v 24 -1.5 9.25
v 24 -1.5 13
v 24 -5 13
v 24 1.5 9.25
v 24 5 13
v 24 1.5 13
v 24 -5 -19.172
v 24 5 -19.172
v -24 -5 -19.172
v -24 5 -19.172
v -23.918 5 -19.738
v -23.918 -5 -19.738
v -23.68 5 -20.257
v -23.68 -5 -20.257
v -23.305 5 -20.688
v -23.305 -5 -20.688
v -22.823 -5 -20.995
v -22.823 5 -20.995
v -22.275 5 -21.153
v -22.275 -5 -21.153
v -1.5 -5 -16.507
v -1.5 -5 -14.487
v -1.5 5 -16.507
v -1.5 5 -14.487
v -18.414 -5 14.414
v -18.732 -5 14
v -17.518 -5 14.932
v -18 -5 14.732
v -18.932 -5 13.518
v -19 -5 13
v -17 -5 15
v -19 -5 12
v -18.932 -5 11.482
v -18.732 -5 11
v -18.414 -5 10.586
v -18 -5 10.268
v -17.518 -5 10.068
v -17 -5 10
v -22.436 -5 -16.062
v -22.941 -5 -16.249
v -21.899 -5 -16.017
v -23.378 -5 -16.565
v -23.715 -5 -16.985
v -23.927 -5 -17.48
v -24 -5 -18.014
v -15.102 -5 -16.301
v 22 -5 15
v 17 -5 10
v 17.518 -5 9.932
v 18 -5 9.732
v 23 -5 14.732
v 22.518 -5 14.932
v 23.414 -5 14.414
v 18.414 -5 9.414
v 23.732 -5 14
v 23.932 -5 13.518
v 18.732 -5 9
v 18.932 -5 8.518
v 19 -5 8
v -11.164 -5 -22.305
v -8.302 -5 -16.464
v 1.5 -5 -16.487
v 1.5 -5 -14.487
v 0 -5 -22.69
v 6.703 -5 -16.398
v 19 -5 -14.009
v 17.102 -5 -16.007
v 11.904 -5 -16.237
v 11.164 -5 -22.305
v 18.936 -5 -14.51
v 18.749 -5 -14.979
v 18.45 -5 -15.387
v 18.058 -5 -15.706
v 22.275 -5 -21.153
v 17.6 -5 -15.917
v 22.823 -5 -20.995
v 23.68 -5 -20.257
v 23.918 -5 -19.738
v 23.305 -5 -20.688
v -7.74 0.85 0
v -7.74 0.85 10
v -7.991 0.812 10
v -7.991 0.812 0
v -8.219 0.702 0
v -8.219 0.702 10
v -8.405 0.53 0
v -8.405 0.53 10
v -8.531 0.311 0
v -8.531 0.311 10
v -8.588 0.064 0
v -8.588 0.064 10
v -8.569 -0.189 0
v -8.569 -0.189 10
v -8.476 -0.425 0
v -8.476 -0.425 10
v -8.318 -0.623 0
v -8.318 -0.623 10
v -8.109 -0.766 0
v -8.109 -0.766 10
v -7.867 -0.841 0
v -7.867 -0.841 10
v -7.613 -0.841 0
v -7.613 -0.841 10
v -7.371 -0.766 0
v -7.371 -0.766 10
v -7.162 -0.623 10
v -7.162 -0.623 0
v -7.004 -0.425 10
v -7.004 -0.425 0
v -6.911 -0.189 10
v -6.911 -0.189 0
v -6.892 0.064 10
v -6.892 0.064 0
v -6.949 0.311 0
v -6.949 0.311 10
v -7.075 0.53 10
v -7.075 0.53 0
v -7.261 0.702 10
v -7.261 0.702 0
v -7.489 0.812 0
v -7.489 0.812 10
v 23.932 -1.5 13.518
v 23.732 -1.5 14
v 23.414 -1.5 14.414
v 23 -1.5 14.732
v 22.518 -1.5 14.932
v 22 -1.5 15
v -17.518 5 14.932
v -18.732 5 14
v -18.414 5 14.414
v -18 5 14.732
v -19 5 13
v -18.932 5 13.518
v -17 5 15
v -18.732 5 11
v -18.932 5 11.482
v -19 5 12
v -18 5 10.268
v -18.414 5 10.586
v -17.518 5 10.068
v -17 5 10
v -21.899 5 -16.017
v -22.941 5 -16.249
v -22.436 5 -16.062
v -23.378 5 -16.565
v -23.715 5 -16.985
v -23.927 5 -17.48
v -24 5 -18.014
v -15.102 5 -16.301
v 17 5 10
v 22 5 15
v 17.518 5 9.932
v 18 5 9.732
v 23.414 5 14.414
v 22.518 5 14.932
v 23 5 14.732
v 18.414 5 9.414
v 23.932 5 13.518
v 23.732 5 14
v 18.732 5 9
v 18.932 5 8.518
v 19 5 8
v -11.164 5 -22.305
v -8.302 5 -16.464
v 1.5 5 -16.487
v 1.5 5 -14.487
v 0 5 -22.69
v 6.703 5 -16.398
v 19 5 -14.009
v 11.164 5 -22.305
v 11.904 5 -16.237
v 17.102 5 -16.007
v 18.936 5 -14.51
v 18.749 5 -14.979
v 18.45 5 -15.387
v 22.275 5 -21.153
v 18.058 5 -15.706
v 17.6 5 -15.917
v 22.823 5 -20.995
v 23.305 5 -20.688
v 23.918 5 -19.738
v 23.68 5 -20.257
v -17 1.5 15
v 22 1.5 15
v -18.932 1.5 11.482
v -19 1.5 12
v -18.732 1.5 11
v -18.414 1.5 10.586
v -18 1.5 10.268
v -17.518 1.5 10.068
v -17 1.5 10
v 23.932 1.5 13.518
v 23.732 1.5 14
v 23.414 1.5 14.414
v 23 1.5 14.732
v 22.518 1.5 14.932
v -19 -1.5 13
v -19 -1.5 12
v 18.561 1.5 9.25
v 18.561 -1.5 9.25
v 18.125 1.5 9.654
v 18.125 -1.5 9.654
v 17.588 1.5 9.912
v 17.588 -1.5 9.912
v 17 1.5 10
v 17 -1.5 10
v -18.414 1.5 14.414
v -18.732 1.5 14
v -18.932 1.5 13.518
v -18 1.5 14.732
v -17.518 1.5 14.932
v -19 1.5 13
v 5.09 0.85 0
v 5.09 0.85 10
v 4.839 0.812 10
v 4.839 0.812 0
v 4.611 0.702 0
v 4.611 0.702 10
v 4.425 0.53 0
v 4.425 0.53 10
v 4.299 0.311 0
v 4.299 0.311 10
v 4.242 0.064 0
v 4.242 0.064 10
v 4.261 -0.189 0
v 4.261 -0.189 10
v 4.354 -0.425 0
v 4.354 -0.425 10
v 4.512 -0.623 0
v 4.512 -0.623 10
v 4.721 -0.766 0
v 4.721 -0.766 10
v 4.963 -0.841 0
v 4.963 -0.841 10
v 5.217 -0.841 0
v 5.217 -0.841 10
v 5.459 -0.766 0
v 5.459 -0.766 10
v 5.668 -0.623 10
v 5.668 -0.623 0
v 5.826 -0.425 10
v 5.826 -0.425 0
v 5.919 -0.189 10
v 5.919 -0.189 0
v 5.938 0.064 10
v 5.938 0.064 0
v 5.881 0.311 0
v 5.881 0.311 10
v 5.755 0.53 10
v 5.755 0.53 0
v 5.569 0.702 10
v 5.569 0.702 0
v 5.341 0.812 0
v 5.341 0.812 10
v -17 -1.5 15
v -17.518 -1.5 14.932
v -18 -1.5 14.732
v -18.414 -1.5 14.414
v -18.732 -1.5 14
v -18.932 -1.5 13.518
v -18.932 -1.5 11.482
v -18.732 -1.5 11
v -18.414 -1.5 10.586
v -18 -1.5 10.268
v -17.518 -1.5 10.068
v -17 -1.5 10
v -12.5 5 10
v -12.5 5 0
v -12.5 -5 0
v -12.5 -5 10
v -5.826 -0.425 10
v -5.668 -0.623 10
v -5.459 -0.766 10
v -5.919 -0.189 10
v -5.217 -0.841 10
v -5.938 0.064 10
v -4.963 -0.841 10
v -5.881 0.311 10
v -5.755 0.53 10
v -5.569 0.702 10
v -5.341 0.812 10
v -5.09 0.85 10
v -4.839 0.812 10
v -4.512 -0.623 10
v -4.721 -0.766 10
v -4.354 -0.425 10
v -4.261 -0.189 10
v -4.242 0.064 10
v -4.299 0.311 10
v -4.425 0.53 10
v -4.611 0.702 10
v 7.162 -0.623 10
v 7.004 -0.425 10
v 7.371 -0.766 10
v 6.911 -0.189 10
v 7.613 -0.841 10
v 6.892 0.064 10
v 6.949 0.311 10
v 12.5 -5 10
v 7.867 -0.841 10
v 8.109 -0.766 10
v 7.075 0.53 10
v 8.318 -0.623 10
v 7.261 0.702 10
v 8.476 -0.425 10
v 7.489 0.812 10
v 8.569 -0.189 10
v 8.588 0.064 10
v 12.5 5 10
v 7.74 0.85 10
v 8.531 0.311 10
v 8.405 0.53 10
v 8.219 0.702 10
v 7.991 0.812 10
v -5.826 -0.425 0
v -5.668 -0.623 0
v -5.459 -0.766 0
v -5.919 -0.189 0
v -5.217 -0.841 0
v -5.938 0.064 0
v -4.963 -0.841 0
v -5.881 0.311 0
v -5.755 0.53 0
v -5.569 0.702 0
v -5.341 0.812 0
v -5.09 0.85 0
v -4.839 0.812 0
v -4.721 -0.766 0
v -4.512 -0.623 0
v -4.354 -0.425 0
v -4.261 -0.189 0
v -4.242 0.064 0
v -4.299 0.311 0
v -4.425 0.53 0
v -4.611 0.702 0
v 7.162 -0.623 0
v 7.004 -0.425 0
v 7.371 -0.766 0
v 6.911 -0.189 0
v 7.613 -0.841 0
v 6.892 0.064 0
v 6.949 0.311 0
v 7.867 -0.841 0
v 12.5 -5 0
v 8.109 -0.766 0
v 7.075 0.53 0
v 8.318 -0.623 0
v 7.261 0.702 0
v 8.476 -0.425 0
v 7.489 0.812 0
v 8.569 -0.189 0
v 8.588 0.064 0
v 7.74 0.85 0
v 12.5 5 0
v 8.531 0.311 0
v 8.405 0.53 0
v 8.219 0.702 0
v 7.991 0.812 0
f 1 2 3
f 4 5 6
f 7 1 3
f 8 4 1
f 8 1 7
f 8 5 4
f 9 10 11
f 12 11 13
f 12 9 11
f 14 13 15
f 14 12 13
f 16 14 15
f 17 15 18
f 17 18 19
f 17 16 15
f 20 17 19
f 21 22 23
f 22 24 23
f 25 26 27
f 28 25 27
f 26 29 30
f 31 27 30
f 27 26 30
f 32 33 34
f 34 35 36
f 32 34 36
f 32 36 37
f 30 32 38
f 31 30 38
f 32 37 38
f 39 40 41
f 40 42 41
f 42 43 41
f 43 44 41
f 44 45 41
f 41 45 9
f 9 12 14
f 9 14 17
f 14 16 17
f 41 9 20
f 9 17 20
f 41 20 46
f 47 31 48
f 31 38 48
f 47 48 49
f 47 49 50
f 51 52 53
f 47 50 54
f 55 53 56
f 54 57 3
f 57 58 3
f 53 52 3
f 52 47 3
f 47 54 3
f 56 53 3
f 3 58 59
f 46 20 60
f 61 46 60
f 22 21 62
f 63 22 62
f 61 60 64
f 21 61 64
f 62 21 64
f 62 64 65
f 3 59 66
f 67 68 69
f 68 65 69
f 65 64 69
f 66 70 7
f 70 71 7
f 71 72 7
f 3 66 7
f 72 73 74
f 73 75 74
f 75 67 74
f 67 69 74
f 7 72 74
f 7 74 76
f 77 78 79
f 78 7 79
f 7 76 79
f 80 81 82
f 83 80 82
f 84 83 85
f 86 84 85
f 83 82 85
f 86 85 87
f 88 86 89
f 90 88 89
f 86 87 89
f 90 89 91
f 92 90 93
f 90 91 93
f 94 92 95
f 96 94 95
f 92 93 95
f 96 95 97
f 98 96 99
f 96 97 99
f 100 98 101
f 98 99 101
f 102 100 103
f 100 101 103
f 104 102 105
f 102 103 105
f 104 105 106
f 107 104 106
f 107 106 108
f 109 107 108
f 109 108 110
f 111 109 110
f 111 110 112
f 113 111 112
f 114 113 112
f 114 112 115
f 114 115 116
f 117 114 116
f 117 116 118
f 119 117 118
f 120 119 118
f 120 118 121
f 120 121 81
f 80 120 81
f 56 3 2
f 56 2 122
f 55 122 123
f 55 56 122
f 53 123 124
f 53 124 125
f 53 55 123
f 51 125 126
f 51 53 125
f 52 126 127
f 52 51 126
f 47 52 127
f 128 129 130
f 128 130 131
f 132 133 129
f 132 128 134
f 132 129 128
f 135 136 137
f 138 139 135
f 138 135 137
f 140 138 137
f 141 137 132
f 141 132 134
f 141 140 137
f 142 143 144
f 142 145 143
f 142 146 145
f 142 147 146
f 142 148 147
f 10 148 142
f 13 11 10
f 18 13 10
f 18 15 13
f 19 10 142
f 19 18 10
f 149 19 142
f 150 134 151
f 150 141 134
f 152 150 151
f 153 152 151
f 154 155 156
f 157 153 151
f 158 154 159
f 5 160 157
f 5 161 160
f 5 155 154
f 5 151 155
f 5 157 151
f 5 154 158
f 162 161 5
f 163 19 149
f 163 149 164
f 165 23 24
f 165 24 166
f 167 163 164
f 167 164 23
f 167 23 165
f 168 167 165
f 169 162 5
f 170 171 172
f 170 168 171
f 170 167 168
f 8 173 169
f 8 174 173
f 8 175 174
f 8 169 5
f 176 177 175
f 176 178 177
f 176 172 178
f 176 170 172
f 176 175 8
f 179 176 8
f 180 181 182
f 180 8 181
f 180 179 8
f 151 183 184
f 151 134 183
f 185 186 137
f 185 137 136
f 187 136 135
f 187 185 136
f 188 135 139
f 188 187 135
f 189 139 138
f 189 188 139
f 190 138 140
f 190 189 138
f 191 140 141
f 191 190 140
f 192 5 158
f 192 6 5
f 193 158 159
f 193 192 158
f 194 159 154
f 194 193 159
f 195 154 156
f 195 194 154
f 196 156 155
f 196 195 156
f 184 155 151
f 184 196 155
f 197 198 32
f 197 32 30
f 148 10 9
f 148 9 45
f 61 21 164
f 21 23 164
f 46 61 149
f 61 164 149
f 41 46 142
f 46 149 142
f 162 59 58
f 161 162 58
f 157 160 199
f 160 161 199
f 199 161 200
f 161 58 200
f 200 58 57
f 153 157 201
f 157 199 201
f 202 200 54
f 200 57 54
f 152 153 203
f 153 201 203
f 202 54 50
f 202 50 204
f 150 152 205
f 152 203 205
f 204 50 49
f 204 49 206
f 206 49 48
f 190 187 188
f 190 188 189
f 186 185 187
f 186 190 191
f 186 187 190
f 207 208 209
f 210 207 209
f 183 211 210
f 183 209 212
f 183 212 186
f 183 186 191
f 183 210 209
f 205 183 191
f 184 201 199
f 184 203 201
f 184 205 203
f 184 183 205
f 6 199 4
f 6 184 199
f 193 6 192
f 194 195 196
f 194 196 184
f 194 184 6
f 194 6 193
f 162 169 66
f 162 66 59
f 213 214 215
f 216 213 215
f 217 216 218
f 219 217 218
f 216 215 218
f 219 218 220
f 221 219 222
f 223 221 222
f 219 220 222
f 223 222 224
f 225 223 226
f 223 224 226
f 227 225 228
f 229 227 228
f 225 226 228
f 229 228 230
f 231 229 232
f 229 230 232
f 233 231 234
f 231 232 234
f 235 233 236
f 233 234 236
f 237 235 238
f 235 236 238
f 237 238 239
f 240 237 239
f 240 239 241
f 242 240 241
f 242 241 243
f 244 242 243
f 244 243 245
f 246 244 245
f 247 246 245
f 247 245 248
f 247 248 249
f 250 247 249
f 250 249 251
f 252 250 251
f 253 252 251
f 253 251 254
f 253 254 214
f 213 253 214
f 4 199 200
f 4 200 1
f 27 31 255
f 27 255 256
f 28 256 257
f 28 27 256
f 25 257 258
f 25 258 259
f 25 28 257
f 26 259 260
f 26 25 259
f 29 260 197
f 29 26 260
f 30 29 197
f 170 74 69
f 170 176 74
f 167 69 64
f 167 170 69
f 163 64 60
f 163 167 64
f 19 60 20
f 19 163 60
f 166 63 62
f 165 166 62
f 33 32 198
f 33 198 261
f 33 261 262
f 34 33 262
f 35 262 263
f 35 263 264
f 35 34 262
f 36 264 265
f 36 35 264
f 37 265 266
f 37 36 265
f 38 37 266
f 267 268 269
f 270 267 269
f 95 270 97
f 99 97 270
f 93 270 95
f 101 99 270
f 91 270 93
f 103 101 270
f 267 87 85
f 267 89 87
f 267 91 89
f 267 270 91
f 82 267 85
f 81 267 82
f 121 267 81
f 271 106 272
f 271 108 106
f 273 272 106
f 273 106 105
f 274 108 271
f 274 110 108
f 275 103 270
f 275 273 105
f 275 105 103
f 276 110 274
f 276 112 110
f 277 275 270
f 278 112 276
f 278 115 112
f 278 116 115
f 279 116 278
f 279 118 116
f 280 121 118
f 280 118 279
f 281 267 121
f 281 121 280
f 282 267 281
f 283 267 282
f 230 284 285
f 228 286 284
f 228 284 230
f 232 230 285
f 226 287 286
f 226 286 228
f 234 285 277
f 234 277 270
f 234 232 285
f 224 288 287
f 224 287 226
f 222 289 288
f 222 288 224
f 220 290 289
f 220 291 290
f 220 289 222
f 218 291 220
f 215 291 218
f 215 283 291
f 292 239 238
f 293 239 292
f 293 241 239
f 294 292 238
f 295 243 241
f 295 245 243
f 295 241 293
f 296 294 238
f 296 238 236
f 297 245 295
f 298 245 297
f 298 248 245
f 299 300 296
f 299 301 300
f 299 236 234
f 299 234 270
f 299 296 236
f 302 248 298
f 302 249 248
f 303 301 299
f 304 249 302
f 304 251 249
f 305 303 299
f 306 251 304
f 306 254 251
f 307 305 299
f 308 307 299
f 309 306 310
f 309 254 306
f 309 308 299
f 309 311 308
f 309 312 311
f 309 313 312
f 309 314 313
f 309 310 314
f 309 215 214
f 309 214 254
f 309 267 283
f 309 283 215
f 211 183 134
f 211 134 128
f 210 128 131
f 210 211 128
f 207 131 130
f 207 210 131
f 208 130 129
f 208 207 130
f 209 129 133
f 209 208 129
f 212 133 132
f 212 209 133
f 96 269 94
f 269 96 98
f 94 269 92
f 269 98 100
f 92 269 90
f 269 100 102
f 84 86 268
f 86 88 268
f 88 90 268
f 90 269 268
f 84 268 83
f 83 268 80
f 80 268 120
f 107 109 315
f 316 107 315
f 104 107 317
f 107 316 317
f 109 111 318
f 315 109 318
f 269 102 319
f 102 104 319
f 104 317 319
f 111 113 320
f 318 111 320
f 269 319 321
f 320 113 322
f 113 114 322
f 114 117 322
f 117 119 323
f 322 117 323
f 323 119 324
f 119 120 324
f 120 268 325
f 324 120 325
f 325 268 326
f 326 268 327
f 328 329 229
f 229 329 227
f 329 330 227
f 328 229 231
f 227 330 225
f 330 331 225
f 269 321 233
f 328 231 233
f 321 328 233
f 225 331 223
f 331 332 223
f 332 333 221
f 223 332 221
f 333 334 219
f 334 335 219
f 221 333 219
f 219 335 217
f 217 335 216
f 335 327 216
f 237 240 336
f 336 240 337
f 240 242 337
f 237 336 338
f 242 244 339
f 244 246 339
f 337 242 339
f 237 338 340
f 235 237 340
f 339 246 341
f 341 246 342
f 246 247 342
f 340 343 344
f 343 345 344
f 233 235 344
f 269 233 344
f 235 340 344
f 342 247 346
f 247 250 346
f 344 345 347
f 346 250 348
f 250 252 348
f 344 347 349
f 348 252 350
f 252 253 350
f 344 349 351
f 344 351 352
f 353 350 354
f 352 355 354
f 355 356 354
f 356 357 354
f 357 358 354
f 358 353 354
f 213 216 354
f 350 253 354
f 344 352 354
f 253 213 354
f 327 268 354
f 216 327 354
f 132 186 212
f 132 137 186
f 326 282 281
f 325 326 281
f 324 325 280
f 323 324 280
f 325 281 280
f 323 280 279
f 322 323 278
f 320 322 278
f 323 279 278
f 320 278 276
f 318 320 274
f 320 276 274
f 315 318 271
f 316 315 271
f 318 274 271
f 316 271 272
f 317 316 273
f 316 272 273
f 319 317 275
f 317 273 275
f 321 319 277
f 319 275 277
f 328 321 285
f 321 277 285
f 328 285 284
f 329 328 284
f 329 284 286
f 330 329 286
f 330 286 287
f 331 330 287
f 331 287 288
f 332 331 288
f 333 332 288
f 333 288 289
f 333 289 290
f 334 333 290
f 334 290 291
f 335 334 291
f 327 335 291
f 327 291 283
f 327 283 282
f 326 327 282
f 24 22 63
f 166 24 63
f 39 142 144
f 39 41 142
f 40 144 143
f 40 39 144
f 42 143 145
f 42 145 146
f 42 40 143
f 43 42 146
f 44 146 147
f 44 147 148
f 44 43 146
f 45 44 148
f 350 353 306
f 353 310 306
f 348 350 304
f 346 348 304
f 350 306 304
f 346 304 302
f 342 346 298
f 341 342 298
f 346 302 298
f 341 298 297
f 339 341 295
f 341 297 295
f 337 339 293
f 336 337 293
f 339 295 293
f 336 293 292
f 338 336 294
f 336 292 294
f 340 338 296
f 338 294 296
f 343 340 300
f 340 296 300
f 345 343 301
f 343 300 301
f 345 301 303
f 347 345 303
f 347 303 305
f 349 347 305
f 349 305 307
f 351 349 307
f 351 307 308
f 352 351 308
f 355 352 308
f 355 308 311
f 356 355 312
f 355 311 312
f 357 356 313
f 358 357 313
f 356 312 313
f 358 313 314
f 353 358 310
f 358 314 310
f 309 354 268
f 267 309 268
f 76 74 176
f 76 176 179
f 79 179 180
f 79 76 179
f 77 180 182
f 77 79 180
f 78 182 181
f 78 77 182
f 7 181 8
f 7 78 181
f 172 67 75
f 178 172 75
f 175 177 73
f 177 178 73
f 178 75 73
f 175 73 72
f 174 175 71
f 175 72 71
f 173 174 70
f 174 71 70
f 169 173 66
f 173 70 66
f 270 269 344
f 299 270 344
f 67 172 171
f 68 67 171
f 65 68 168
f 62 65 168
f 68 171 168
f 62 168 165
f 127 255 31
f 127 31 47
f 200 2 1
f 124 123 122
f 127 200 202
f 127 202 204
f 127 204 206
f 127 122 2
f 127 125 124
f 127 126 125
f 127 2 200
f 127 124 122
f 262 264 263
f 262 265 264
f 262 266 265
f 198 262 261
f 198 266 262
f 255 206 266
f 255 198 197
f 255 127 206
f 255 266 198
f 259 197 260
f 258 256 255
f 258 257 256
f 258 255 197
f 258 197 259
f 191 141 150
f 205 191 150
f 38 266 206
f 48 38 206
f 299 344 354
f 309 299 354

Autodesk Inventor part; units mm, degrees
ref_plane "YZ Plane" through (0, 0, 0) normal (1, 0, 0) x (0, 1, 0)
ref_plane "XZ Plane" through (0, 0, 0) normal (0, 1, 0) x (-1, 0, 0)
ref_plane "XY Plane" through (0, 0, 0) normal (0, 0, 1) x (1, 0, 0)
sketch "Sketch1" plane through (0, 0, 0) normal (0, 0, 1) x (1, 0, 0)
  line L0 (-5.09, 0) -> (5.09, 0) construction
  line L1 (-7.74, 0) -> (-5.09, 0) construction
  line L2 (5.09, 0) -> (7.74, 0) construction
  line L3 (-12.5, -5) -> (12.5, -5)
  line L4 (12.5, -5) -> (12.5, 5)
  line L5 (12.5, 5) -> (-12.5, 5)
  line L6 (-12.5, 5) -> (-12.5, -5)
  point P0 (0, 0)
  point P1 (0, 0)
  point P2 (-12.5, 0)
  point P3 (0, 5)
  dimension "d0" = 2.65
  dimension "d1" = 12.83
  dimension "d2" = 25
  dimension "d3" = 10
extrude "Extrusion1" add sketch "Sketch1" along normal blind 10
hole "Hole1" at (-5.09, 0, 0) at (5.09, 0, 0) at (7.74, 0, 0) at (-7.74, 0, 0) direction (0, 0, 1) diameter 1.7 end through all
sketch "Sketch2" plane through (-12.5, 5, 0) normal (0, 1, 0) x (1, 0, 0)
  line L0 (25, 0) -> (0, 0) construction
  line L1 (0, 0) -> (0, -10) construction
  line L2 (25, -10) -> (0, -10) construction
  line L3 (25, 0) -> (25, -10) construction
  line L4 (-6.5, -10) -> (-6.5, -15)
  line L5 (-6.5, -15) -> (36.5, -15)
  line L6 (36.5, -15) -> (36.5, 20.9046)
  arc A0 (36.5, 20.9046) -> (-11.5, 20.9046) centre (12.5, -139.5491) ccw
  arc A1 (31.5, 15.9046) -> (-11.5, 15.9046) centre (10, -366.7641) ccw
  line L7 (-6.5, -10) -> (31.5, -10)
  line L8 (25, -10) -> (0, -10) projected
  line L9 (12.5, 0) -> (12.5, 16.5) construction
  line L10 (25, 0) -> (0, 0) projected
  line L11 (31.5, 15.9046) -> (31.5, -10)
  line L12 (-11.5, 20.9046) -> (-11.5, 15.9046)
  point P0 (12.5, -10)
  point P1 (12.5, -10)
  dimension "d13" = 38
  dimension "d15" = 5
  dimension "d16" = 5
  dimension "d18" = 16.5
  dimension "d19" = 5
  dimension "d20" = 383.2723
  dimension "d21" = 162.2388
extrude "Extrusion2" add sketch "Sketch2" against normal up to surface (10 mm away) separate body
sketch "Sketch3" plane through (-12.5, 5, 0) normal (0, 1, 0) x (1, 0, 0)
  arc A0 (31.5, 15.9046) -> (-11.5, 15.9046) centre (10, -366.7641) ccw projected
  line L0 (11, 14.4873) -> (14, 14.4873)
  line L1 (14, 14.4873) -> (14, 16.4873)
  line L2 (11, 14.4873) -> (11, 16.5068)
  line L3 (25, 0) -> (0, 0) projected
  point P0 (12.5, 0)
  point P1 (12.5, 14.4873)
  point P2 (12.5, 0)
  dimension "d24" = 2
  dimension "d25" = 3
extrude "Extrusion3" add sketch "Sketch3" against normal up to surface (10 mm away) bodies 2
fillet "Fillet1" radius 2 8 edges at (19, 0, -15.9046) (19, 0, 10) (24, 0, 15) (24, 0, -20.9046) (-24, 0, -15.9046) (-24, 0, -20.9046) (-19, 0, 10) (-19, 0, 15)
sketch "Sketch4" plane through (-17, 5, 15) normal (0, 0, 1) x (1, 0, 0)
  line L0 (0, -10) -> (0, 0) construction
  line L1 (0, -10) -> (39, -10) construction
  line L2 (39, 0) -> (39, -10) construction
  line L3 (0, 0) -> (39, 0) construction
  line L4 (-7, -3.5) -> (41, -3.5)
  line L5 (41, -3.5) -> (41, -6.5)
  line L6 (41, -6.5) -> (-7, -6.5)
  line L7 (-7, -6.5) -> (-7, -3.5)
  line L8 (41, -10) -> (41, 0) projected
  line L9 (-7, 0) -> (-7, -10) projected
  point P0 (17, -5)
  point P1 (41, -5)
  point P2 (39, -5)
  dimension "d29" = 3
extrude "Extrusion4" cut sketch "Sketch4" against normal blind 5.75 bodies 2
properties part number "pogo-holder-base"
